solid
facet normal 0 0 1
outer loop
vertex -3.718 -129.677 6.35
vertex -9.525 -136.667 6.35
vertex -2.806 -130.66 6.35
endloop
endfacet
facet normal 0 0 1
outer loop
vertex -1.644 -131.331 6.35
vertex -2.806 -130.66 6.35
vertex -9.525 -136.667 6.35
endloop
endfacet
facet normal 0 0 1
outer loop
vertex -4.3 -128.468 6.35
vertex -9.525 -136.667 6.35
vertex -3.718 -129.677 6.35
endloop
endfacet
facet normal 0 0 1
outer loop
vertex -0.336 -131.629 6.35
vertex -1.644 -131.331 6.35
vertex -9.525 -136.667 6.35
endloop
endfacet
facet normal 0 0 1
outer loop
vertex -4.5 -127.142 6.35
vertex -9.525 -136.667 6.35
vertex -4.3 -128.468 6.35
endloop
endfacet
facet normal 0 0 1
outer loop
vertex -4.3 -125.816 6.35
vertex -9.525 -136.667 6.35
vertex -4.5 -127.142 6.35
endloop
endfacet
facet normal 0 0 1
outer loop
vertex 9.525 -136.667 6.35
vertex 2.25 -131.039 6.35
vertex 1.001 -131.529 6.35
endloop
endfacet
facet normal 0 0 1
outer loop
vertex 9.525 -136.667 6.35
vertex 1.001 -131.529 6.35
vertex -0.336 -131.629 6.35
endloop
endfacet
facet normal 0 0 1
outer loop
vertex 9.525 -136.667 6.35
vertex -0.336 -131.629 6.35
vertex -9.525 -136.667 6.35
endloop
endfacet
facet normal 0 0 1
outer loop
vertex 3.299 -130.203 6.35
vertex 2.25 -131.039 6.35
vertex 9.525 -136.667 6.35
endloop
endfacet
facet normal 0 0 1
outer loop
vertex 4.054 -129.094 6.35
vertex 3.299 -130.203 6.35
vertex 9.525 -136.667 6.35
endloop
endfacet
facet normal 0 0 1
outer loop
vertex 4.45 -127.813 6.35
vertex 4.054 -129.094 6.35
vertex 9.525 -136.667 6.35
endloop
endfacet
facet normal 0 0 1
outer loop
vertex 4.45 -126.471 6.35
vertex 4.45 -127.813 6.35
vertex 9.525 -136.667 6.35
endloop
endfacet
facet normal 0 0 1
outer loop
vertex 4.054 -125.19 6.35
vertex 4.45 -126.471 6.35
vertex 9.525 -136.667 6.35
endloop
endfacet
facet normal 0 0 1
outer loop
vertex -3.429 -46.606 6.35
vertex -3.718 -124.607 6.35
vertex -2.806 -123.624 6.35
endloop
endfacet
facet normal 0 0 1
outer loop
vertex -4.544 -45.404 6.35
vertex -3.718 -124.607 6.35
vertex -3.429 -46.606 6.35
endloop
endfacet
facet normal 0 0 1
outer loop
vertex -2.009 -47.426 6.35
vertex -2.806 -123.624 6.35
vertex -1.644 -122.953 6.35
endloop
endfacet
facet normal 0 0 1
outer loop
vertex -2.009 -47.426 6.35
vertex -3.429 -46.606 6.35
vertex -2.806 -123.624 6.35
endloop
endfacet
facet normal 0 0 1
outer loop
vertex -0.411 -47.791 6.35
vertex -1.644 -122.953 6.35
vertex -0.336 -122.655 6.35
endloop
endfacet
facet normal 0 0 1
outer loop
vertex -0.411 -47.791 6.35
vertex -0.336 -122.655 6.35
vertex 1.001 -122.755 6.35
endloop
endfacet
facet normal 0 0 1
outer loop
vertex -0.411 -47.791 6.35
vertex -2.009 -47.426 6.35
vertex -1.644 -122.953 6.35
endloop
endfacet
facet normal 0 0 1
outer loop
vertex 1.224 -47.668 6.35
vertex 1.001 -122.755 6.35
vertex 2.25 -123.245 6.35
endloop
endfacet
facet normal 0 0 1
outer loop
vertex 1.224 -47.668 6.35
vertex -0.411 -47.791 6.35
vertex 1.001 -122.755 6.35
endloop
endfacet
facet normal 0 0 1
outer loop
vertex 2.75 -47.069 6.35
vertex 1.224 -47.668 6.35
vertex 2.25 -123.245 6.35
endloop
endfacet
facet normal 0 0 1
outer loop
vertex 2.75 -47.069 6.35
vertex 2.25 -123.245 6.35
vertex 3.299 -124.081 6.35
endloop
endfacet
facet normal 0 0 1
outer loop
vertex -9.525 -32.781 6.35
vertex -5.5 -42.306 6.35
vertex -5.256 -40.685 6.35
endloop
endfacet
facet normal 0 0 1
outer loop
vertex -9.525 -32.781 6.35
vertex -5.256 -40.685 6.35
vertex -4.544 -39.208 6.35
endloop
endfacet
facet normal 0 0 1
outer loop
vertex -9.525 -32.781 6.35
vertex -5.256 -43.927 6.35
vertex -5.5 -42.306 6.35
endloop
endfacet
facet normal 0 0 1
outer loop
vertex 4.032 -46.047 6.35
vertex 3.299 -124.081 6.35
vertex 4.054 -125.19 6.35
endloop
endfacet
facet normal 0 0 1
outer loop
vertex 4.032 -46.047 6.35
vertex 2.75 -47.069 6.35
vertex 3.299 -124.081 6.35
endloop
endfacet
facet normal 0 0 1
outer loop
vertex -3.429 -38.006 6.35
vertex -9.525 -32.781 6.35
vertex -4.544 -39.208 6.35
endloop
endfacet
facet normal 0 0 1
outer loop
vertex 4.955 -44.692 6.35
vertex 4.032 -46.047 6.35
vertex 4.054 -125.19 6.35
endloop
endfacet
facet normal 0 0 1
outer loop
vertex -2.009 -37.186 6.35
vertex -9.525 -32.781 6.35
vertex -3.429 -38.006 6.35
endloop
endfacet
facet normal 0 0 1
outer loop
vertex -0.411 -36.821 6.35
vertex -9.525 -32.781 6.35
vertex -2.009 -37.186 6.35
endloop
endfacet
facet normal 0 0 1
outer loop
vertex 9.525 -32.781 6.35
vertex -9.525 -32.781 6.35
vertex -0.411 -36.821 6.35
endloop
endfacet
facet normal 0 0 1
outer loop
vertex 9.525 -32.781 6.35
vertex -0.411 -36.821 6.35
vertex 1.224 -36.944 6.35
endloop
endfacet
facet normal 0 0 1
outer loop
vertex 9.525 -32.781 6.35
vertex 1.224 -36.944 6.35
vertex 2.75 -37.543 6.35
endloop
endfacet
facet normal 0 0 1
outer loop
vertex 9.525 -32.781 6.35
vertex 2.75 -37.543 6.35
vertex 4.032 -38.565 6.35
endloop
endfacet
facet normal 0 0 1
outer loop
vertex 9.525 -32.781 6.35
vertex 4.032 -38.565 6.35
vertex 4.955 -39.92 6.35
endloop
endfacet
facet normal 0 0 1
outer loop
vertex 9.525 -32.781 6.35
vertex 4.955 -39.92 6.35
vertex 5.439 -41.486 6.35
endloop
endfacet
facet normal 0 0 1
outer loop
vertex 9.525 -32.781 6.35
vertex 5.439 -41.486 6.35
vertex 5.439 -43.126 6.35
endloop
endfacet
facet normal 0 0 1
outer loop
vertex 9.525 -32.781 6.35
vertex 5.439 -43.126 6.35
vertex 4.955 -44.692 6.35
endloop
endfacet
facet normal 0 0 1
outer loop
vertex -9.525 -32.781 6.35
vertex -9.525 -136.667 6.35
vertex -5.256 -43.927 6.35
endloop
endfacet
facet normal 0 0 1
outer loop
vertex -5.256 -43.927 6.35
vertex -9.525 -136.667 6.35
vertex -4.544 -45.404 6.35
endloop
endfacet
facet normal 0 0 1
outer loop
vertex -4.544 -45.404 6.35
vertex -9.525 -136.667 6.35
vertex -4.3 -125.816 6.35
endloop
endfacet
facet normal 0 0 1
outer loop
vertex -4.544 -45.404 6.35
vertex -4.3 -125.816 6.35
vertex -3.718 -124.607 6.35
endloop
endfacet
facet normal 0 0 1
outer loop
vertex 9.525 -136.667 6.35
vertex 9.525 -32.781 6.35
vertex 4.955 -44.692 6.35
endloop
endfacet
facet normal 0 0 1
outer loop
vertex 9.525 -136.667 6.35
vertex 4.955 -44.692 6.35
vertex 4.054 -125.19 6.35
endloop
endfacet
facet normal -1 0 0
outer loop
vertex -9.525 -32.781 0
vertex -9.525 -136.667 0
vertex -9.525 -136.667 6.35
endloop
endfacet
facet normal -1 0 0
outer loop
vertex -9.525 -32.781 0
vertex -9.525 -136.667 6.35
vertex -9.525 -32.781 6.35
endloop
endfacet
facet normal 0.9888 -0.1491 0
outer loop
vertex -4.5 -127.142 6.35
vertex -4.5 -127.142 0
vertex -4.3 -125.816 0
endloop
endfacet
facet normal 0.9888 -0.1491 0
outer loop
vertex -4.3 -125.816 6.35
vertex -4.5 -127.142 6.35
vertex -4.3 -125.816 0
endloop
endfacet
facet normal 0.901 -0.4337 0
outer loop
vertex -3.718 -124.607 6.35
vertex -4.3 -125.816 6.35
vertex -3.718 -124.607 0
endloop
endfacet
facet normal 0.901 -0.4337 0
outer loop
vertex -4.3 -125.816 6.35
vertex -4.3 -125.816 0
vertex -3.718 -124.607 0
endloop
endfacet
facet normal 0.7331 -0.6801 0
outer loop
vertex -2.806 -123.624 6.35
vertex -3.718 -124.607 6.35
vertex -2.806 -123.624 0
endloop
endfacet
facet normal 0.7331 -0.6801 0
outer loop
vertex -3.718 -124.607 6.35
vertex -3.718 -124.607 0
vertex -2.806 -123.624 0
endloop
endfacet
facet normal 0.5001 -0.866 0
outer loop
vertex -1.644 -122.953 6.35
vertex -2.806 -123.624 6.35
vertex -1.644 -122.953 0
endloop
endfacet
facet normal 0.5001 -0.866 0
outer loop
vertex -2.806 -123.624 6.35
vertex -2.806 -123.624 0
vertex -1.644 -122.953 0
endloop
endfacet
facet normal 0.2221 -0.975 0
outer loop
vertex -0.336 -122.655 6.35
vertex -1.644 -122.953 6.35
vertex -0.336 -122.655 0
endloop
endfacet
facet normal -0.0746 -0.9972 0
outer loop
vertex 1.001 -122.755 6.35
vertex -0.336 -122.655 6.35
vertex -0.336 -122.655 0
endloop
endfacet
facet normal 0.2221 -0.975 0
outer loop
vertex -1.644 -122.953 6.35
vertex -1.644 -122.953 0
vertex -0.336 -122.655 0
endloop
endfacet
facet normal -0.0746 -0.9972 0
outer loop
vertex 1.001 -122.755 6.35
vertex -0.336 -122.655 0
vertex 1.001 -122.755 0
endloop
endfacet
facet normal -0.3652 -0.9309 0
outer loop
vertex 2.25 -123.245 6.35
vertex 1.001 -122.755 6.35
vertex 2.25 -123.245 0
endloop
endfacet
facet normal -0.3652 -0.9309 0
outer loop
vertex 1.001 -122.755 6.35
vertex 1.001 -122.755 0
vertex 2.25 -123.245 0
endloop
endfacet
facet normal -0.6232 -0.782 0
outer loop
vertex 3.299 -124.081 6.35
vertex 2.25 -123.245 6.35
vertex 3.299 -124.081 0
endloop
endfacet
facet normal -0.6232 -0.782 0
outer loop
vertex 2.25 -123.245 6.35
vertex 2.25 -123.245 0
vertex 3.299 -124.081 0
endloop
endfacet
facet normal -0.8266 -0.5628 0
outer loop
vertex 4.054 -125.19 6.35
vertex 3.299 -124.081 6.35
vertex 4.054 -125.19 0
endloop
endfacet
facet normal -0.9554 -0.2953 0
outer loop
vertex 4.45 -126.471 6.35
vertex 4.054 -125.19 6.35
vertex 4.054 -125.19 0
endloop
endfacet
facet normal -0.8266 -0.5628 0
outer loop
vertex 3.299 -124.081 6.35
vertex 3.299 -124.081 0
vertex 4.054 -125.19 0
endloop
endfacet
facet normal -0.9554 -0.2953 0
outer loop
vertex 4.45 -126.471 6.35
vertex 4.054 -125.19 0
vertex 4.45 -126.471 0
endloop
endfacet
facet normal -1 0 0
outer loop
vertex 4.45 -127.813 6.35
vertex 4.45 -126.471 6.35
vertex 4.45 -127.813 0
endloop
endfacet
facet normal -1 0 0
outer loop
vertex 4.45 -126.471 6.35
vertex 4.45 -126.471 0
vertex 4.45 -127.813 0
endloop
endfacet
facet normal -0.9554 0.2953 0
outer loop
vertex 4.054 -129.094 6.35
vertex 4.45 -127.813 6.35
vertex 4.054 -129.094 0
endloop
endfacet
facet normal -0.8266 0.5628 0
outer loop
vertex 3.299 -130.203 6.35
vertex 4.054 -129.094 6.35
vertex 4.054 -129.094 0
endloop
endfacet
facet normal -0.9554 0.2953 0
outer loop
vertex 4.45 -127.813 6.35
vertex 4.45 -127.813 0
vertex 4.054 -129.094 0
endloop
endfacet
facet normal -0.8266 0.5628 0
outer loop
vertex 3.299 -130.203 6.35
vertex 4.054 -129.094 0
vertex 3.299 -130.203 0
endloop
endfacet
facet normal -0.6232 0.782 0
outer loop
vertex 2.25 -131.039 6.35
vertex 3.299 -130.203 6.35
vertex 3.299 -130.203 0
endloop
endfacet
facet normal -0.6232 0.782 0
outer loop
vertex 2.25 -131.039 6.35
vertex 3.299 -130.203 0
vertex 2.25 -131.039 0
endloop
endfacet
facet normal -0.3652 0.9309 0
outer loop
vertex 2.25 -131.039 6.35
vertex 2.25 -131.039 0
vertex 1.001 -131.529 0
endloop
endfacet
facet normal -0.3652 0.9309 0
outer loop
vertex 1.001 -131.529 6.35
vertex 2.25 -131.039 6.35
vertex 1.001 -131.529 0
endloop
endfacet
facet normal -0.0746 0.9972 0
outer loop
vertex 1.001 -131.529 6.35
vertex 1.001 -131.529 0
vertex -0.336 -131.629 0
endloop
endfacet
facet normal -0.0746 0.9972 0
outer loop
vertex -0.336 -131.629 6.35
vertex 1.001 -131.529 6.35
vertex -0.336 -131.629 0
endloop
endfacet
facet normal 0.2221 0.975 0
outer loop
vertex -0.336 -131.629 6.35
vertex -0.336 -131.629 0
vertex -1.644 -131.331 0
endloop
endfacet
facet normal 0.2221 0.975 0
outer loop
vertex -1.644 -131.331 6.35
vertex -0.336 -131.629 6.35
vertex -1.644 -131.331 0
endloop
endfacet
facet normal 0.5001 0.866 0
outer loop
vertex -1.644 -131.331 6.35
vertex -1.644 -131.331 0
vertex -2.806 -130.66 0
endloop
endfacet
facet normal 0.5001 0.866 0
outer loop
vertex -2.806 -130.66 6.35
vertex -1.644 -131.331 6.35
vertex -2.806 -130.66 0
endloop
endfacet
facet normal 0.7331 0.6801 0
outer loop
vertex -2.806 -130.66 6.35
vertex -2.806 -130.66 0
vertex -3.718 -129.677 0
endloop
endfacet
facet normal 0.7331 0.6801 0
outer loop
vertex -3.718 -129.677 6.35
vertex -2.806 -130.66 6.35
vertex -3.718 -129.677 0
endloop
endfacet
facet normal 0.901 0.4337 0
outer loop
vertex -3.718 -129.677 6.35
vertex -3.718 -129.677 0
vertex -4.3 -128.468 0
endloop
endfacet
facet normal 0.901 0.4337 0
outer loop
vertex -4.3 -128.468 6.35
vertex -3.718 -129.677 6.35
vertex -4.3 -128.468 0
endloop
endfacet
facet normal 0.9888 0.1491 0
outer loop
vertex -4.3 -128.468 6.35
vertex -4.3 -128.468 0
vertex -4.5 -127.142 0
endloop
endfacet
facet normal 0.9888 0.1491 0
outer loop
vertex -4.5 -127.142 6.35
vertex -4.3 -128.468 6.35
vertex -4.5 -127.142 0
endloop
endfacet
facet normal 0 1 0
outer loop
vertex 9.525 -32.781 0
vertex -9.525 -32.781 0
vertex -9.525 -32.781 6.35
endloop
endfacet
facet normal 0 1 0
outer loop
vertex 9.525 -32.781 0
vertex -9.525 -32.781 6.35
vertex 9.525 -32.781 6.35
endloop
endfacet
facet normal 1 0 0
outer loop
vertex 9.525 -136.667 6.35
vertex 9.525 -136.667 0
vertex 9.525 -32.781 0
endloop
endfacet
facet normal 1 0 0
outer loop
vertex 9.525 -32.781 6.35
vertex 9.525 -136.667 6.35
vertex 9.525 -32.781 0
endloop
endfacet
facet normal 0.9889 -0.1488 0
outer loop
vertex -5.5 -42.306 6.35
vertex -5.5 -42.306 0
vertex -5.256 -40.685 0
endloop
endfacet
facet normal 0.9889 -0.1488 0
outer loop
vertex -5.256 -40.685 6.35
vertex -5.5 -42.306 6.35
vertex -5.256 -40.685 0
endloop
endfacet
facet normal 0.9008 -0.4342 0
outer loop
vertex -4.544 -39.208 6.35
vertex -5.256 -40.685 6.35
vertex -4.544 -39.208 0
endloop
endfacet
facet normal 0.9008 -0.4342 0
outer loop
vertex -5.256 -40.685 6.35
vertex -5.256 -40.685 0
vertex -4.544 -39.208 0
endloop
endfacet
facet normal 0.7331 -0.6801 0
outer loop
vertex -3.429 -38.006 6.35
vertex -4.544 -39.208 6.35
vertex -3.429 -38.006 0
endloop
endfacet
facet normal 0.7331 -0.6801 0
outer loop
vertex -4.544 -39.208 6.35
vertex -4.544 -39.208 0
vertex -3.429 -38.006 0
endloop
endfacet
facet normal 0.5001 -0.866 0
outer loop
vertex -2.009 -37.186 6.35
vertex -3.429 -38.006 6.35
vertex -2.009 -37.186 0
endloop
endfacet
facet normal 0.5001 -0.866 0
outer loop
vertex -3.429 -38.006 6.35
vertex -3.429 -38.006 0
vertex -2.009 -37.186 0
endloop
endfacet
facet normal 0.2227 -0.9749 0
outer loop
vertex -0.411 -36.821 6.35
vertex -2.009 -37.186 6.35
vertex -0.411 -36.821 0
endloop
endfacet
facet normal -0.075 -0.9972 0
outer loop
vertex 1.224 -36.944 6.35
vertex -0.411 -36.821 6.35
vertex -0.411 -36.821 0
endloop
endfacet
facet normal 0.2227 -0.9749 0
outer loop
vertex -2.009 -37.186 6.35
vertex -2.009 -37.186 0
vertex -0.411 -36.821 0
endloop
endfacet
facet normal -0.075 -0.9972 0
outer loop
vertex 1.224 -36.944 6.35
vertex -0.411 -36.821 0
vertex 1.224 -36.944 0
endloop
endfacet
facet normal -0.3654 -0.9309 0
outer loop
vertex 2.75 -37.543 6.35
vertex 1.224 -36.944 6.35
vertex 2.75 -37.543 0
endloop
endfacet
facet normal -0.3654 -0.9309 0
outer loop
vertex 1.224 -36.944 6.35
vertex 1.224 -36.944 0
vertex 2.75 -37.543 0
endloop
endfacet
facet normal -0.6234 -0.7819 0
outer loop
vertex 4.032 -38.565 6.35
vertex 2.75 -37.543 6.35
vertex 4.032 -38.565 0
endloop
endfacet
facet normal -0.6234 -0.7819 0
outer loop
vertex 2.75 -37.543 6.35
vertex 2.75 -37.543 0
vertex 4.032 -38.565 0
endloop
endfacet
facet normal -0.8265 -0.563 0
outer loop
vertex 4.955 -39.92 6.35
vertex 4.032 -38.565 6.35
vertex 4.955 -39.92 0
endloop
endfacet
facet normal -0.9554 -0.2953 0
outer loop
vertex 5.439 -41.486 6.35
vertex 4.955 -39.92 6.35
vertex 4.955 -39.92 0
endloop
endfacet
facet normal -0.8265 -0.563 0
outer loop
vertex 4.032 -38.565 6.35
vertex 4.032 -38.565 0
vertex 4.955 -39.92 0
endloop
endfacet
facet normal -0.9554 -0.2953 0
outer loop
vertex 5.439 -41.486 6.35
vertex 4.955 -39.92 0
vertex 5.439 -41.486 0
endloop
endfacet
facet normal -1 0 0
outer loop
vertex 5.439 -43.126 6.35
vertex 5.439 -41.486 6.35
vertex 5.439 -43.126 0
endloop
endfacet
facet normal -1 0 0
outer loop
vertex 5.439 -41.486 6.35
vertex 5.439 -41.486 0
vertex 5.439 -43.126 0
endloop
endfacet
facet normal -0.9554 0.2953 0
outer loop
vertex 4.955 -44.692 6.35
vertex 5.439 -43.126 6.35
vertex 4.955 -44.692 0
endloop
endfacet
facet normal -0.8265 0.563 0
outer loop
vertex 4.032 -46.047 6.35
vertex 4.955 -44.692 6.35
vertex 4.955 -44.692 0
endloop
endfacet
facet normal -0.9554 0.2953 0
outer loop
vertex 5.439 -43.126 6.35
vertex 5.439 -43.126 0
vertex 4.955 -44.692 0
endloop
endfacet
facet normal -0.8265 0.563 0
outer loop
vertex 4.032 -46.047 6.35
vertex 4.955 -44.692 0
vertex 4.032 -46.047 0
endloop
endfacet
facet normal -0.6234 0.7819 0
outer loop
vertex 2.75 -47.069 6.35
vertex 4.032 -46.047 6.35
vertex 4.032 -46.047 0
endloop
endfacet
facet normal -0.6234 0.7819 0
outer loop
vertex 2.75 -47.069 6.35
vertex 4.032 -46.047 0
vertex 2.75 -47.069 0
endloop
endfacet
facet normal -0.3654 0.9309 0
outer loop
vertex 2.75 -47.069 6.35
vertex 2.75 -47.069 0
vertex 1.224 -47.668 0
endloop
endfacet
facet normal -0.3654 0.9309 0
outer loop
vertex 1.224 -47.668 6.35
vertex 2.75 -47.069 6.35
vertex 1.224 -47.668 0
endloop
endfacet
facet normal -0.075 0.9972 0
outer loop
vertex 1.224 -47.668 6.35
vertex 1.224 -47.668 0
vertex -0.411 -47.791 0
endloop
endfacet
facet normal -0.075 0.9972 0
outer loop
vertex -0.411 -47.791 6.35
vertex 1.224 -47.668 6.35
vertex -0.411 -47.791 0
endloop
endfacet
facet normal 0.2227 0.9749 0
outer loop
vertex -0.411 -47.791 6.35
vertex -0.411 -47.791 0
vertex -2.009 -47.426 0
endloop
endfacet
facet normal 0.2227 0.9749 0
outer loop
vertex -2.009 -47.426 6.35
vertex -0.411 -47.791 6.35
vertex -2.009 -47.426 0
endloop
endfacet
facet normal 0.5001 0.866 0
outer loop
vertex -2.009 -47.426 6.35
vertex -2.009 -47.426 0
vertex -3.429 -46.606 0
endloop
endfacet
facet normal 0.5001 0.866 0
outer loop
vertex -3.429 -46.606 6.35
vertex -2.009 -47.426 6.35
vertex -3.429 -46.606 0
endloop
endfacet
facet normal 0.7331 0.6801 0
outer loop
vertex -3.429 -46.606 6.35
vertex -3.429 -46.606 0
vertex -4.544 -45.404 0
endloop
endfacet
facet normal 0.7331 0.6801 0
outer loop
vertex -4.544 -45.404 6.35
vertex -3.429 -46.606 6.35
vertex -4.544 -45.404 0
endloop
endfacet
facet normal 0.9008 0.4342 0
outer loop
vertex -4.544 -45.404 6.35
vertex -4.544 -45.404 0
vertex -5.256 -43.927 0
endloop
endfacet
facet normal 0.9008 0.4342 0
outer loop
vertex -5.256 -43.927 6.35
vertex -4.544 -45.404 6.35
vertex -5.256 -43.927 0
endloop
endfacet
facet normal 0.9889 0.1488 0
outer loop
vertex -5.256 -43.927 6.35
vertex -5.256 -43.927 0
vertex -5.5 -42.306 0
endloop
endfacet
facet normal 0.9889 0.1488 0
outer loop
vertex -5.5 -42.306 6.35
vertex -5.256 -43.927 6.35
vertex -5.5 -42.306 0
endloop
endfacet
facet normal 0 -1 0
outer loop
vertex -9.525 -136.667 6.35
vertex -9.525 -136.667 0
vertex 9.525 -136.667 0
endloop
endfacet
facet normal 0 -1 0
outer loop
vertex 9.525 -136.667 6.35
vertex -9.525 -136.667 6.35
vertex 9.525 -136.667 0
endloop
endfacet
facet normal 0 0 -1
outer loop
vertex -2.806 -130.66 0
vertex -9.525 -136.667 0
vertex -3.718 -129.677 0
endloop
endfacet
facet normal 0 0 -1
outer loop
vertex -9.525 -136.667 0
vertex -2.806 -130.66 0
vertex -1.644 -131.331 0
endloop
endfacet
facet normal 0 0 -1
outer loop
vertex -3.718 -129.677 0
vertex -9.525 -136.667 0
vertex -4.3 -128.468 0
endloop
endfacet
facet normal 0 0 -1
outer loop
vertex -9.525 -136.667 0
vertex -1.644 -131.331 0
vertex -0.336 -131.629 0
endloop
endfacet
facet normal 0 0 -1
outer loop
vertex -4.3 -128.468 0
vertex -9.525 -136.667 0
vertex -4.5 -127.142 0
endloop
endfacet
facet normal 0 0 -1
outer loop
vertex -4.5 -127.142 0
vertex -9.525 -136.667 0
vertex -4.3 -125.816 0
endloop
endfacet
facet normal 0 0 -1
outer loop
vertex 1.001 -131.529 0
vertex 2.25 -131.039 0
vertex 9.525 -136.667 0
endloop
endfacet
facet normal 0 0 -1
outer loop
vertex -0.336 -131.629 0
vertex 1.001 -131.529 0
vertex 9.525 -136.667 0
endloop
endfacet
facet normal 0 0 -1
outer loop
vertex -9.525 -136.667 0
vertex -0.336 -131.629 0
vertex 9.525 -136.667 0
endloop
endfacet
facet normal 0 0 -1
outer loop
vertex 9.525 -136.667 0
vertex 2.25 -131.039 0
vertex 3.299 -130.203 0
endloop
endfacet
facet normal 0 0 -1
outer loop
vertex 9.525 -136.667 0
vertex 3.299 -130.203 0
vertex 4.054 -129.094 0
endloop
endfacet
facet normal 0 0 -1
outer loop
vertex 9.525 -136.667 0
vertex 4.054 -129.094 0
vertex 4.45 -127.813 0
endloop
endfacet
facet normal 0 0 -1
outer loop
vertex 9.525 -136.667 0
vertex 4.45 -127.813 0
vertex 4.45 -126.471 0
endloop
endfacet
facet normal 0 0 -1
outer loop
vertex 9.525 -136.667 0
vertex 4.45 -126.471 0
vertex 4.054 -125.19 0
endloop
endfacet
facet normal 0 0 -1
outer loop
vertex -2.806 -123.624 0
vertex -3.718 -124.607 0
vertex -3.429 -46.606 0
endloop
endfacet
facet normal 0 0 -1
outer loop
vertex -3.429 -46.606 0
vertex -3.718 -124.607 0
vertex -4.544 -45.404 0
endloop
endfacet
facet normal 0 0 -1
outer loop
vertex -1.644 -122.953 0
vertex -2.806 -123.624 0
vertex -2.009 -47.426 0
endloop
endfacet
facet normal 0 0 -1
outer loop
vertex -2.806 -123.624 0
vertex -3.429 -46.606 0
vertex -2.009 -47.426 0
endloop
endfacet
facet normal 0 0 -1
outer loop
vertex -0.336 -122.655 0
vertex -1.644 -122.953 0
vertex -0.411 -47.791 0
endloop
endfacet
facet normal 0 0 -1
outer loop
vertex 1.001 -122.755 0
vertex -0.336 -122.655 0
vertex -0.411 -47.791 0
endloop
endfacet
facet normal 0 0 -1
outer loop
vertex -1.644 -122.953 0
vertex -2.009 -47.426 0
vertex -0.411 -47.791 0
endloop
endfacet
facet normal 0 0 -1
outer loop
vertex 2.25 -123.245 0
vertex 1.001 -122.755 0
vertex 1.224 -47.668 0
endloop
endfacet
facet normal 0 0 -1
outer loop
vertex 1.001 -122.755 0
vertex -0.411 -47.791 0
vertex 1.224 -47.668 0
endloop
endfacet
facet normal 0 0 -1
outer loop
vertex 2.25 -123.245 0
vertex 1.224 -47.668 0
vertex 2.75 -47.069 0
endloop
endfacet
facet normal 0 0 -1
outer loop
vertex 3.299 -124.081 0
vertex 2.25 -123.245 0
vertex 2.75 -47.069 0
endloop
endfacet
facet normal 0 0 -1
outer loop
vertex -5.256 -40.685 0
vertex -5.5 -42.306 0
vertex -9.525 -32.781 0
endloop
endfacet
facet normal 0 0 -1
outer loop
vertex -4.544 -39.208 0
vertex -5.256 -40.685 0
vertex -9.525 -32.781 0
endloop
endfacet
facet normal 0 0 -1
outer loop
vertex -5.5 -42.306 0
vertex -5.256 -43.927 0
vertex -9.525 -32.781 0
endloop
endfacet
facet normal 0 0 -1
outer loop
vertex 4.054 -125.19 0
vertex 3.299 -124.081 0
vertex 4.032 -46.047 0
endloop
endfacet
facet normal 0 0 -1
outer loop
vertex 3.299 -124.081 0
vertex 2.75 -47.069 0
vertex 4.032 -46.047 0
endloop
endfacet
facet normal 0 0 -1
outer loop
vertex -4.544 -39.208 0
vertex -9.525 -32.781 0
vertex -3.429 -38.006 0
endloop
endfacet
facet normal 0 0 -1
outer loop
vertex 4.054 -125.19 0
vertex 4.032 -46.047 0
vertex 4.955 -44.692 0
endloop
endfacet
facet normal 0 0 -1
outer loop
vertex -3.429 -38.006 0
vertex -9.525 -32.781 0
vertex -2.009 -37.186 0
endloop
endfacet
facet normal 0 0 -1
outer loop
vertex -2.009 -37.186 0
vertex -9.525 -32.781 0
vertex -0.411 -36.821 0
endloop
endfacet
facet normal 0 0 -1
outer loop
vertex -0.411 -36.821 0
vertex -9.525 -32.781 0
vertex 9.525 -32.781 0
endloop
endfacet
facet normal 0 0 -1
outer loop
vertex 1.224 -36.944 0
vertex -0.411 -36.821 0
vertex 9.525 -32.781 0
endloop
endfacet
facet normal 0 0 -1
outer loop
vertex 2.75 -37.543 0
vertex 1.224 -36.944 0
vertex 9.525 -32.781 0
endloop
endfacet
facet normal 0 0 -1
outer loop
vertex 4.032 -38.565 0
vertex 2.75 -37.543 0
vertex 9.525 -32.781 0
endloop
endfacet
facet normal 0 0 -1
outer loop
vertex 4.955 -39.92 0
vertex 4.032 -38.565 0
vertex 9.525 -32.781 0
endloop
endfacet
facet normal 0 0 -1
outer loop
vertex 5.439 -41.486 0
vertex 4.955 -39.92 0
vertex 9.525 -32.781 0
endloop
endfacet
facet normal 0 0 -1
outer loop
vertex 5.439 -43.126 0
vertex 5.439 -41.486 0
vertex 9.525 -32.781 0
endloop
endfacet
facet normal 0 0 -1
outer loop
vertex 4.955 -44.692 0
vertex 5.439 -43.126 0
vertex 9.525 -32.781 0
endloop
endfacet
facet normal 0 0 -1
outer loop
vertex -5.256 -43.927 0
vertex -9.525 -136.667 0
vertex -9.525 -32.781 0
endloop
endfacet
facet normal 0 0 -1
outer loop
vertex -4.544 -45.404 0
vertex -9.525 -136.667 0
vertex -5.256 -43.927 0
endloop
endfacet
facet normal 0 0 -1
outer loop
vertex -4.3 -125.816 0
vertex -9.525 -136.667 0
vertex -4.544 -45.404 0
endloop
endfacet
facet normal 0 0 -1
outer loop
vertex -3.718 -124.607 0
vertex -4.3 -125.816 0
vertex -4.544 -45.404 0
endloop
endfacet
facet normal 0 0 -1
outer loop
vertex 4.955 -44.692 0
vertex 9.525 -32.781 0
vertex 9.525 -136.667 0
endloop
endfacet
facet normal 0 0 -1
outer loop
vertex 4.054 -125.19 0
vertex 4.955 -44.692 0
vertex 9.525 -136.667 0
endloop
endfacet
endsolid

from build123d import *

# Parameters (mm, degrees)
SKETCH1_W                 = 19.05
SKETCH1_H                 = 103.886
BOSS_EXTRUDE1_DEPTH       = 6.35
M8_CLEARANCE_HOLE1_D      = 9
M8_CLEARANCE_HOLE1_DEPTH  = 21.082
M8_CLEARANCE_HOLE1_TIP    = 2.703872786
M10_CLEARANCE_HOLE1_D     = 11
M10_CLEARANCE_HOLE1_DEPTH = 21.082
M10_CLEARANCE_HOLE1_TIP   = 3.304733405


with BuildPart() as part:
    # Sketch1 → Boss-Extrude1 (new body)
    with BuildSketch(Plane.XY):
        with Locations((0, -84.724)):
            Rectangle(SKETCH1_W, SKETCH1_H)
    extrude(amount=BOSS_EXTRUDE1_DEPTH)

    # M8 Clearance Hole1
    with Locations(Plane.XY.offset(6.35)):
        with Locations((0, -127.142)):
            Hole(M8_CLEARANCE_HOLE1_D / 2, depth=M8_CLEARANCE_HOLE1_DEPTH)
            with Locations((0, 0, -(M8_CLEARANCE_HOLE1_DEPTH + M8_CLEARANCE_HOLE1_TIP / 2))):  # 118° drill point
                Cone(0, M8_CLEARANCE_HOLE1_D / 2, M8_CLEARANCE_HOLE1_TIP, mode=Mode.SUBTRACT)

    # M10 Clearance Hole1
    with Locations(Plane.XY.offset(6.35)):
        with Locations((0, -42.306)):
            Hole(M10_CLEARANCE_HOLE1_D / 2, depth=M10_CLEARANCE_HOLE1_DEPTH)
            with Locations((0, 0, -(M10_CLEARANCE_HOLE1_DEPTH + M10_CLEARANCE_HOLE1_TIP / 2))):  # 118° drill point
                Cone(0, M10_CLEARANCE_HOLE1_D / 2, M10_CLEARANCE_HOLE1_TIP, mode=Mode.SUBTRACT)


solid = part.part
